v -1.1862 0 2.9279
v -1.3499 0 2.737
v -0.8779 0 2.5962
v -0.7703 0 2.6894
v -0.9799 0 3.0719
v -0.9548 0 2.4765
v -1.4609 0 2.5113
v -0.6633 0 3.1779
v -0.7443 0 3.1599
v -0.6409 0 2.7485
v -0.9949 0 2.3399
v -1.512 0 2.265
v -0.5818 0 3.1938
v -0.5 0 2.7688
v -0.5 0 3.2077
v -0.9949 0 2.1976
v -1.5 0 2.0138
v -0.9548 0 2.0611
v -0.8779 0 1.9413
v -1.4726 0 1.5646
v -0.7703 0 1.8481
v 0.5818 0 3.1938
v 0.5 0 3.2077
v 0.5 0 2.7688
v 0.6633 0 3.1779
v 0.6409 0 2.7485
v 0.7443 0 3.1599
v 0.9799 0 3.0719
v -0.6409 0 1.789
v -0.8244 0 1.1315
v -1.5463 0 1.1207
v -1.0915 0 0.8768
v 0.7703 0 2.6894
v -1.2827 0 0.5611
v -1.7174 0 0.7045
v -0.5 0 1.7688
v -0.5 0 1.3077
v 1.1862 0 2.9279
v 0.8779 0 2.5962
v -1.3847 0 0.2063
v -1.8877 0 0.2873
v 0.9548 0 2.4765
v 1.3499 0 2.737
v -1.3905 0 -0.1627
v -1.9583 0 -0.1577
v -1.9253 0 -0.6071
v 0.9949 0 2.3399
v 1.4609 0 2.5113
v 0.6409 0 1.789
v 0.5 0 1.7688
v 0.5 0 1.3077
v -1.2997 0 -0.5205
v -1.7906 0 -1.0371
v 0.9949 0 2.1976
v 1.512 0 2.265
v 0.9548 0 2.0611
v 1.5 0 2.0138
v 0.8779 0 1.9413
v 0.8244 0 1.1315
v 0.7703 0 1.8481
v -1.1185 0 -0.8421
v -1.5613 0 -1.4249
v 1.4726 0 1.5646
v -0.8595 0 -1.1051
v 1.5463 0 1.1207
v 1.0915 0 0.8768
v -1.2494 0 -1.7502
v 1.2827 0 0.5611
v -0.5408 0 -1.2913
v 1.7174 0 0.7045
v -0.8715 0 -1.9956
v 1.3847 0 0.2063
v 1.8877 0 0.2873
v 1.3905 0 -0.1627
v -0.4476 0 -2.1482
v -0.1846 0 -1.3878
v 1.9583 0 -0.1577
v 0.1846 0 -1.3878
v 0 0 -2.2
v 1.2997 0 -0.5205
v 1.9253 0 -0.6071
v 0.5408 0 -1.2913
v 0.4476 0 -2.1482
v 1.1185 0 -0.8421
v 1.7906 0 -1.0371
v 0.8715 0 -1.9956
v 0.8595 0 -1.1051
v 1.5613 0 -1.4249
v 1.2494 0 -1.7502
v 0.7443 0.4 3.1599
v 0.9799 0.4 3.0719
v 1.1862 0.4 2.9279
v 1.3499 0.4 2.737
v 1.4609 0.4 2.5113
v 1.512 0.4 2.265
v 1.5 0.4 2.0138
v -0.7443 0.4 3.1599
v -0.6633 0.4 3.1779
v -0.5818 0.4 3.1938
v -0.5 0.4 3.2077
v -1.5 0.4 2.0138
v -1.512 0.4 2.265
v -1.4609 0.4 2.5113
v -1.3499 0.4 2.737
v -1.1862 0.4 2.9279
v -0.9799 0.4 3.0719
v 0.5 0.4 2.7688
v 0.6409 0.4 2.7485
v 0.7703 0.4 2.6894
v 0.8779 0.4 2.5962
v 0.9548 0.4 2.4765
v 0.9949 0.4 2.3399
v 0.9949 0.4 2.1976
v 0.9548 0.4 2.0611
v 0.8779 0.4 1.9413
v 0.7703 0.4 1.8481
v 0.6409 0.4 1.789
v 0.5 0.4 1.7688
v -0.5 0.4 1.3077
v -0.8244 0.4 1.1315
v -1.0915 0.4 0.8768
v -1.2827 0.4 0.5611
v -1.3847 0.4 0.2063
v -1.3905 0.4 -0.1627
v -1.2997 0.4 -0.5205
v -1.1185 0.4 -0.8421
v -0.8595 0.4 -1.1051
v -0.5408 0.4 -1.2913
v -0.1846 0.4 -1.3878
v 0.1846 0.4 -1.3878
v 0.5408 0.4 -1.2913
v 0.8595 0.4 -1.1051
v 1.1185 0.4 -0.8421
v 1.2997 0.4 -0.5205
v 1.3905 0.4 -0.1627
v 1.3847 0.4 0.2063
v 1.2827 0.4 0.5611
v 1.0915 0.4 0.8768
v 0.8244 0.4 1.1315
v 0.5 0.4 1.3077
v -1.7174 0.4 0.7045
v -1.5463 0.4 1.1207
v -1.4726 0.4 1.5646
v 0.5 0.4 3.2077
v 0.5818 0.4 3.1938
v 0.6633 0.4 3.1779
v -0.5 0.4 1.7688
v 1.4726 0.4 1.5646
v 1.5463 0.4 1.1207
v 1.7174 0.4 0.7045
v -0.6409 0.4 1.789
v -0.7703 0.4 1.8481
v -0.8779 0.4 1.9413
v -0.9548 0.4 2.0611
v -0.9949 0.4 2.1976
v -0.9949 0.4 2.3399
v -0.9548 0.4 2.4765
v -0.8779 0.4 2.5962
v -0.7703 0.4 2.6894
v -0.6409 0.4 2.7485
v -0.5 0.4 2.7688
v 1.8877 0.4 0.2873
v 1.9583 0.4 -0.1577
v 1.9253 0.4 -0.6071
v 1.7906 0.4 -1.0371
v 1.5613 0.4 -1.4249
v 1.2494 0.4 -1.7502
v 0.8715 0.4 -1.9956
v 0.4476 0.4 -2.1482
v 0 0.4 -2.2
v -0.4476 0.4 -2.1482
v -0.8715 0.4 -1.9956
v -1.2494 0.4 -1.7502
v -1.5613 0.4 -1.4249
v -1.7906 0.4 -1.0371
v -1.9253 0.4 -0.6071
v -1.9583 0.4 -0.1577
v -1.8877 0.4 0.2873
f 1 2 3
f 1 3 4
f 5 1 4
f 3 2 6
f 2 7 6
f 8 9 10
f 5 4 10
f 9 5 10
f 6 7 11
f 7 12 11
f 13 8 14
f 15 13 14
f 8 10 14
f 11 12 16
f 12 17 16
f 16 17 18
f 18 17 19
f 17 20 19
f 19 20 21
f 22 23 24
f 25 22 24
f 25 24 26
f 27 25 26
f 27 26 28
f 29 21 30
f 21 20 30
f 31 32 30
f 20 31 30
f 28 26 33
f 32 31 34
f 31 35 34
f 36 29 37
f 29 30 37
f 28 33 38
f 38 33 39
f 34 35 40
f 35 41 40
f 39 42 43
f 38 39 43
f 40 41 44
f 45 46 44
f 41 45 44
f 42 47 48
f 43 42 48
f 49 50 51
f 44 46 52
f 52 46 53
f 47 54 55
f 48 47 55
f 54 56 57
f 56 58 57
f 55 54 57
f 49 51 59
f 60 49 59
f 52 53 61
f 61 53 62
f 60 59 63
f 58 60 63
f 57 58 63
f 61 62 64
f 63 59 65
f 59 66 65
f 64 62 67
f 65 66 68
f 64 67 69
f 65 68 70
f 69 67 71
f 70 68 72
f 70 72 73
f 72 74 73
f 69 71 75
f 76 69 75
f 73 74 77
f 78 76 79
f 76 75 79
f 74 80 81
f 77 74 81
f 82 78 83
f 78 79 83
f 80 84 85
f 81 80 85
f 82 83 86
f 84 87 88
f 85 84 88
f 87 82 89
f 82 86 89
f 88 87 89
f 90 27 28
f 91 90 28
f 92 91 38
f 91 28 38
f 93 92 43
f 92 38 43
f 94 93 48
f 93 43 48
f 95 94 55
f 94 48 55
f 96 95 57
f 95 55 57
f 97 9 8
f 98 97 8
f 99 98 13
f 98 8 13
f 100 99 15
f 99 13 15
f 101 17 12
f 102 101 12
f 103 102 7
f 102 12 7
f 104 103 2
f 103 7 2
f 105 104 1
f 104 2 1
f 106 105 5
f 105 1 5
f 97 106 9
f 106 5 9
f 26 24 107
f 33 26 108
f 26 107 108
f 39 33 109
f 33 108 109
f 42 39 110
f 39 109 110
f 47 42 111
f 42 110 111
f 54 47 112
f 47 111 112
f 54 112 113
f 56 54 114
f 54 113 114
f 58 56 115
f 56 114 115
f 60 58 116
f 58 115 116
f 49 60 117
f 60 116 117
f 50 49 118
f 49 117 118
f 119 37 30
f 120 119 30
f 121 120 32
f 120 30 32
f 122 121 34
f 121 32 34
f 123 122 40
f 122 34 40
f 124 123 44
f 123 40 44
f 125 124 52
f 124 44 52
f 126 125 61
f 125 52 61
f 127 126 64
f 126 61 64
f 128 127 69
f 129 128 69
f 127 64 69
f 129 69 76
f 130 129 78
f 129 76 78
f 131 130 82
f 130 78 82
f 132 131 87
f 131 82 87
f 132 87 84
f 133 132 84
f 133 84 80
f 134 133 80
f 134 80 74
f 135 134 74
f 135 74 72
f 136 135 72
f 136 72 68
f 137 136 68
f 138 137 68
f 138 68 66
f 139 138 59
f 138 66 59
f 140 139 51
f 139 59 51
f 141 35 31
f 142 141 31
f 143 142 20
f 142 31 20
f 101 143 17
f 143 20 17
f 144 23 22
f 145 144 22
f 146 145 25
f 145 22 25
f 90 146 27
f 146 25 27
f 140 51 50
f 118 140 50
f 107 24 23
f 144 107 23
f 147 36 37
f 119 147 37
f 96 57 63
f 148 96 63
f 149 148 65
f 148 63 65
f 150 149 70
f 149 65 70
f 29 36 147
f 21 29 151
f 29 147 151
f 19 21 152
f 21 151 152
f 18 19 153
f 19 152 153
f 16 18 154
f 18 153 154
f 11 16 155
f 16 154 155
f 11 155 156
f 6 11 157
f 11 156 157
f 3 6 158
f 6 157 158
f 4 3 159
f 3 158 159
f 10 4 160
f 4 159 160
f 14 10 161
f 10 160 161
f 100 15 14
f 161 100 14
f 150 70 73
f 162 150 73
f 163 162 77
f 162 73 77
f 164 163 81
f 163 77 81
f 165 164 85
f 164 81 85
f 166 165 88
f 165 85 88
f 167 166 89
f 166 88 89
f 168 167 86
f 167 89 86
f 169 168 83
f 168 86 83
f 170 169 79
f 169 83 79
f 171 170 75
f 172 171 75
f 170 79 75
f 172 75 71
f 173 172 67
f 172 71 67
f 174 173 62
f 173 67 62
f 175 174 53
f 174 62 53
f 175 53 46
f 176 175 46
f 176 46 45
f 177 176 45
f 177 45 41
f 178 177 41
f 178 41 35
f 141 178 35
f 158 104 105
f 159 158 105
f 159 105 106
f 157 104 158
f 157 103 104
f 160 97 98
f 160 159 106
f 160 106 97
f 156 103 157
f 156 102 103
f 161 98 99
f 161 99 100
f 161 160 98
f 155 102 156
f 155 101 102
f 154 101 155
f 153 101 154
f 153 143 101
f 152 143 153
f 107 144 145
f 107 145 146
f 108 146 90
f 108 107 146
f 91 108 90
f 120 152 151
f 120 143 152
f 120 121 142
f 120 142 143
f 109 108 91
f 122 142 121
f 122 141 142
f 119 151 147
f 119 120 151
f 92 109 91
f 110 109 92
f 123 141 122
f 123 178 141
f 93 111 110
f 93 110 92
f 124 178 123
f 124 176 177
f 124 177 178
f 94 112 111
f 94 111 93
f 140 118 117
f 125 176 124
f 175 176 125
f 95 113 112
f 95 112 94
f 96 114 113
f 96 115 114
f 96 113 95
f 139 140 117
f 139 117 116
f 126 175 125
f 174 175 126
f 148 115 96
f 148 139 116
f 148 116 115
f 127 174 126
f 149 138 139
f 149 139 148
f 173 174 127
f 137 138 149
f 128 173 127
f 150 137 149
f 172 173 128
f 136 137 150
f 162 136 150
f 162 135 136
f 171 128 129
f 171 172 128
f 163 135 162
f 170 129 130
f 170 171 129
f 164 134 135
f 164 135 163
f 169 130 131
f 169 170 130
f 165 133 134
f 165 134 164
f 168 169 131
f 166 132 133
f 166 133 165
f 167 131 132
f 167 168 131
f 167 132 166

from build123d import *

# Parameters (mm, degrees)
EXTRUDE_1_DEPTH     = 0.4
SKETCH_2_R          = 0.5
CUT_EXTRUDE_1_DEPTH = 4.780310145


with BuildPart() as part:
    # 草图1 → 凸台-拉伸1 (new body)
    with BuildSketch(Plane(origin=(0, 0, 0), x_dir=(1, 0, 0), z_dir=(0, 1, 0))):
        with BuildLine():
            Line((-0.5, -3.207669683), (-0.5, -1.307669683))
            ThreePointArc((-0.5, -1.307669683), (0, 1.4), (0.5, -1.307669683))
            Line((0.5, -1.307669683), (0.5, -3.207669683))
            ThreePointArc((0.5, -3.207669683), (0.622614647, -3.186141208), (0.744313737, -3.159927508))
            ThreePointArc((0.744313737, -3.159927508), (1.349908047, -2.737016303), (1.5, -2.013779993))
            ThreePointArc((1.5, -2.013779993), (1.496939857, -1.340560945), (1.717434649, -0.704467165))
            ThreePointArc((1.717434649, -0.704467165), (0, 2.2), (-1.717434649, -0.704467165))
            ThreePointArc((-1.717434649, -0.704467165), (-1.496939857, -1.340560945), (-1.5, -2.013779993))
            ThreePointArc((-1.5, -2.013779993), (-1.349908047, -2.737016303), (-0.744313737, -3.159927508))
            ThreePointArc((-0.744313737, -3.159927508), (-0.622614647, -3.186141208), (-0.5, -3.207669683))
        make_face()
    extrude(amount=EXTRUDE_1_DEPTH)

    # 草图2 → 切除-拉伸1 (cut, through all)
    with BuildSketch(Plane(origin=(0, 0.4, 0), x_dir=(1, 0, 0), z_dir=(0, 1, 0))):
        with Locations((-0.5, -2.268759492)):
            Circle(SKETCH_2_R)
        with Locations((0.5, -2.268759492)):
            Circle(SKETCH_2_R)
    extrude(amount=-CUT_EXTRUDE_1_DEPTH, mode=Mode.SUBTRACT)


solid = part.part
